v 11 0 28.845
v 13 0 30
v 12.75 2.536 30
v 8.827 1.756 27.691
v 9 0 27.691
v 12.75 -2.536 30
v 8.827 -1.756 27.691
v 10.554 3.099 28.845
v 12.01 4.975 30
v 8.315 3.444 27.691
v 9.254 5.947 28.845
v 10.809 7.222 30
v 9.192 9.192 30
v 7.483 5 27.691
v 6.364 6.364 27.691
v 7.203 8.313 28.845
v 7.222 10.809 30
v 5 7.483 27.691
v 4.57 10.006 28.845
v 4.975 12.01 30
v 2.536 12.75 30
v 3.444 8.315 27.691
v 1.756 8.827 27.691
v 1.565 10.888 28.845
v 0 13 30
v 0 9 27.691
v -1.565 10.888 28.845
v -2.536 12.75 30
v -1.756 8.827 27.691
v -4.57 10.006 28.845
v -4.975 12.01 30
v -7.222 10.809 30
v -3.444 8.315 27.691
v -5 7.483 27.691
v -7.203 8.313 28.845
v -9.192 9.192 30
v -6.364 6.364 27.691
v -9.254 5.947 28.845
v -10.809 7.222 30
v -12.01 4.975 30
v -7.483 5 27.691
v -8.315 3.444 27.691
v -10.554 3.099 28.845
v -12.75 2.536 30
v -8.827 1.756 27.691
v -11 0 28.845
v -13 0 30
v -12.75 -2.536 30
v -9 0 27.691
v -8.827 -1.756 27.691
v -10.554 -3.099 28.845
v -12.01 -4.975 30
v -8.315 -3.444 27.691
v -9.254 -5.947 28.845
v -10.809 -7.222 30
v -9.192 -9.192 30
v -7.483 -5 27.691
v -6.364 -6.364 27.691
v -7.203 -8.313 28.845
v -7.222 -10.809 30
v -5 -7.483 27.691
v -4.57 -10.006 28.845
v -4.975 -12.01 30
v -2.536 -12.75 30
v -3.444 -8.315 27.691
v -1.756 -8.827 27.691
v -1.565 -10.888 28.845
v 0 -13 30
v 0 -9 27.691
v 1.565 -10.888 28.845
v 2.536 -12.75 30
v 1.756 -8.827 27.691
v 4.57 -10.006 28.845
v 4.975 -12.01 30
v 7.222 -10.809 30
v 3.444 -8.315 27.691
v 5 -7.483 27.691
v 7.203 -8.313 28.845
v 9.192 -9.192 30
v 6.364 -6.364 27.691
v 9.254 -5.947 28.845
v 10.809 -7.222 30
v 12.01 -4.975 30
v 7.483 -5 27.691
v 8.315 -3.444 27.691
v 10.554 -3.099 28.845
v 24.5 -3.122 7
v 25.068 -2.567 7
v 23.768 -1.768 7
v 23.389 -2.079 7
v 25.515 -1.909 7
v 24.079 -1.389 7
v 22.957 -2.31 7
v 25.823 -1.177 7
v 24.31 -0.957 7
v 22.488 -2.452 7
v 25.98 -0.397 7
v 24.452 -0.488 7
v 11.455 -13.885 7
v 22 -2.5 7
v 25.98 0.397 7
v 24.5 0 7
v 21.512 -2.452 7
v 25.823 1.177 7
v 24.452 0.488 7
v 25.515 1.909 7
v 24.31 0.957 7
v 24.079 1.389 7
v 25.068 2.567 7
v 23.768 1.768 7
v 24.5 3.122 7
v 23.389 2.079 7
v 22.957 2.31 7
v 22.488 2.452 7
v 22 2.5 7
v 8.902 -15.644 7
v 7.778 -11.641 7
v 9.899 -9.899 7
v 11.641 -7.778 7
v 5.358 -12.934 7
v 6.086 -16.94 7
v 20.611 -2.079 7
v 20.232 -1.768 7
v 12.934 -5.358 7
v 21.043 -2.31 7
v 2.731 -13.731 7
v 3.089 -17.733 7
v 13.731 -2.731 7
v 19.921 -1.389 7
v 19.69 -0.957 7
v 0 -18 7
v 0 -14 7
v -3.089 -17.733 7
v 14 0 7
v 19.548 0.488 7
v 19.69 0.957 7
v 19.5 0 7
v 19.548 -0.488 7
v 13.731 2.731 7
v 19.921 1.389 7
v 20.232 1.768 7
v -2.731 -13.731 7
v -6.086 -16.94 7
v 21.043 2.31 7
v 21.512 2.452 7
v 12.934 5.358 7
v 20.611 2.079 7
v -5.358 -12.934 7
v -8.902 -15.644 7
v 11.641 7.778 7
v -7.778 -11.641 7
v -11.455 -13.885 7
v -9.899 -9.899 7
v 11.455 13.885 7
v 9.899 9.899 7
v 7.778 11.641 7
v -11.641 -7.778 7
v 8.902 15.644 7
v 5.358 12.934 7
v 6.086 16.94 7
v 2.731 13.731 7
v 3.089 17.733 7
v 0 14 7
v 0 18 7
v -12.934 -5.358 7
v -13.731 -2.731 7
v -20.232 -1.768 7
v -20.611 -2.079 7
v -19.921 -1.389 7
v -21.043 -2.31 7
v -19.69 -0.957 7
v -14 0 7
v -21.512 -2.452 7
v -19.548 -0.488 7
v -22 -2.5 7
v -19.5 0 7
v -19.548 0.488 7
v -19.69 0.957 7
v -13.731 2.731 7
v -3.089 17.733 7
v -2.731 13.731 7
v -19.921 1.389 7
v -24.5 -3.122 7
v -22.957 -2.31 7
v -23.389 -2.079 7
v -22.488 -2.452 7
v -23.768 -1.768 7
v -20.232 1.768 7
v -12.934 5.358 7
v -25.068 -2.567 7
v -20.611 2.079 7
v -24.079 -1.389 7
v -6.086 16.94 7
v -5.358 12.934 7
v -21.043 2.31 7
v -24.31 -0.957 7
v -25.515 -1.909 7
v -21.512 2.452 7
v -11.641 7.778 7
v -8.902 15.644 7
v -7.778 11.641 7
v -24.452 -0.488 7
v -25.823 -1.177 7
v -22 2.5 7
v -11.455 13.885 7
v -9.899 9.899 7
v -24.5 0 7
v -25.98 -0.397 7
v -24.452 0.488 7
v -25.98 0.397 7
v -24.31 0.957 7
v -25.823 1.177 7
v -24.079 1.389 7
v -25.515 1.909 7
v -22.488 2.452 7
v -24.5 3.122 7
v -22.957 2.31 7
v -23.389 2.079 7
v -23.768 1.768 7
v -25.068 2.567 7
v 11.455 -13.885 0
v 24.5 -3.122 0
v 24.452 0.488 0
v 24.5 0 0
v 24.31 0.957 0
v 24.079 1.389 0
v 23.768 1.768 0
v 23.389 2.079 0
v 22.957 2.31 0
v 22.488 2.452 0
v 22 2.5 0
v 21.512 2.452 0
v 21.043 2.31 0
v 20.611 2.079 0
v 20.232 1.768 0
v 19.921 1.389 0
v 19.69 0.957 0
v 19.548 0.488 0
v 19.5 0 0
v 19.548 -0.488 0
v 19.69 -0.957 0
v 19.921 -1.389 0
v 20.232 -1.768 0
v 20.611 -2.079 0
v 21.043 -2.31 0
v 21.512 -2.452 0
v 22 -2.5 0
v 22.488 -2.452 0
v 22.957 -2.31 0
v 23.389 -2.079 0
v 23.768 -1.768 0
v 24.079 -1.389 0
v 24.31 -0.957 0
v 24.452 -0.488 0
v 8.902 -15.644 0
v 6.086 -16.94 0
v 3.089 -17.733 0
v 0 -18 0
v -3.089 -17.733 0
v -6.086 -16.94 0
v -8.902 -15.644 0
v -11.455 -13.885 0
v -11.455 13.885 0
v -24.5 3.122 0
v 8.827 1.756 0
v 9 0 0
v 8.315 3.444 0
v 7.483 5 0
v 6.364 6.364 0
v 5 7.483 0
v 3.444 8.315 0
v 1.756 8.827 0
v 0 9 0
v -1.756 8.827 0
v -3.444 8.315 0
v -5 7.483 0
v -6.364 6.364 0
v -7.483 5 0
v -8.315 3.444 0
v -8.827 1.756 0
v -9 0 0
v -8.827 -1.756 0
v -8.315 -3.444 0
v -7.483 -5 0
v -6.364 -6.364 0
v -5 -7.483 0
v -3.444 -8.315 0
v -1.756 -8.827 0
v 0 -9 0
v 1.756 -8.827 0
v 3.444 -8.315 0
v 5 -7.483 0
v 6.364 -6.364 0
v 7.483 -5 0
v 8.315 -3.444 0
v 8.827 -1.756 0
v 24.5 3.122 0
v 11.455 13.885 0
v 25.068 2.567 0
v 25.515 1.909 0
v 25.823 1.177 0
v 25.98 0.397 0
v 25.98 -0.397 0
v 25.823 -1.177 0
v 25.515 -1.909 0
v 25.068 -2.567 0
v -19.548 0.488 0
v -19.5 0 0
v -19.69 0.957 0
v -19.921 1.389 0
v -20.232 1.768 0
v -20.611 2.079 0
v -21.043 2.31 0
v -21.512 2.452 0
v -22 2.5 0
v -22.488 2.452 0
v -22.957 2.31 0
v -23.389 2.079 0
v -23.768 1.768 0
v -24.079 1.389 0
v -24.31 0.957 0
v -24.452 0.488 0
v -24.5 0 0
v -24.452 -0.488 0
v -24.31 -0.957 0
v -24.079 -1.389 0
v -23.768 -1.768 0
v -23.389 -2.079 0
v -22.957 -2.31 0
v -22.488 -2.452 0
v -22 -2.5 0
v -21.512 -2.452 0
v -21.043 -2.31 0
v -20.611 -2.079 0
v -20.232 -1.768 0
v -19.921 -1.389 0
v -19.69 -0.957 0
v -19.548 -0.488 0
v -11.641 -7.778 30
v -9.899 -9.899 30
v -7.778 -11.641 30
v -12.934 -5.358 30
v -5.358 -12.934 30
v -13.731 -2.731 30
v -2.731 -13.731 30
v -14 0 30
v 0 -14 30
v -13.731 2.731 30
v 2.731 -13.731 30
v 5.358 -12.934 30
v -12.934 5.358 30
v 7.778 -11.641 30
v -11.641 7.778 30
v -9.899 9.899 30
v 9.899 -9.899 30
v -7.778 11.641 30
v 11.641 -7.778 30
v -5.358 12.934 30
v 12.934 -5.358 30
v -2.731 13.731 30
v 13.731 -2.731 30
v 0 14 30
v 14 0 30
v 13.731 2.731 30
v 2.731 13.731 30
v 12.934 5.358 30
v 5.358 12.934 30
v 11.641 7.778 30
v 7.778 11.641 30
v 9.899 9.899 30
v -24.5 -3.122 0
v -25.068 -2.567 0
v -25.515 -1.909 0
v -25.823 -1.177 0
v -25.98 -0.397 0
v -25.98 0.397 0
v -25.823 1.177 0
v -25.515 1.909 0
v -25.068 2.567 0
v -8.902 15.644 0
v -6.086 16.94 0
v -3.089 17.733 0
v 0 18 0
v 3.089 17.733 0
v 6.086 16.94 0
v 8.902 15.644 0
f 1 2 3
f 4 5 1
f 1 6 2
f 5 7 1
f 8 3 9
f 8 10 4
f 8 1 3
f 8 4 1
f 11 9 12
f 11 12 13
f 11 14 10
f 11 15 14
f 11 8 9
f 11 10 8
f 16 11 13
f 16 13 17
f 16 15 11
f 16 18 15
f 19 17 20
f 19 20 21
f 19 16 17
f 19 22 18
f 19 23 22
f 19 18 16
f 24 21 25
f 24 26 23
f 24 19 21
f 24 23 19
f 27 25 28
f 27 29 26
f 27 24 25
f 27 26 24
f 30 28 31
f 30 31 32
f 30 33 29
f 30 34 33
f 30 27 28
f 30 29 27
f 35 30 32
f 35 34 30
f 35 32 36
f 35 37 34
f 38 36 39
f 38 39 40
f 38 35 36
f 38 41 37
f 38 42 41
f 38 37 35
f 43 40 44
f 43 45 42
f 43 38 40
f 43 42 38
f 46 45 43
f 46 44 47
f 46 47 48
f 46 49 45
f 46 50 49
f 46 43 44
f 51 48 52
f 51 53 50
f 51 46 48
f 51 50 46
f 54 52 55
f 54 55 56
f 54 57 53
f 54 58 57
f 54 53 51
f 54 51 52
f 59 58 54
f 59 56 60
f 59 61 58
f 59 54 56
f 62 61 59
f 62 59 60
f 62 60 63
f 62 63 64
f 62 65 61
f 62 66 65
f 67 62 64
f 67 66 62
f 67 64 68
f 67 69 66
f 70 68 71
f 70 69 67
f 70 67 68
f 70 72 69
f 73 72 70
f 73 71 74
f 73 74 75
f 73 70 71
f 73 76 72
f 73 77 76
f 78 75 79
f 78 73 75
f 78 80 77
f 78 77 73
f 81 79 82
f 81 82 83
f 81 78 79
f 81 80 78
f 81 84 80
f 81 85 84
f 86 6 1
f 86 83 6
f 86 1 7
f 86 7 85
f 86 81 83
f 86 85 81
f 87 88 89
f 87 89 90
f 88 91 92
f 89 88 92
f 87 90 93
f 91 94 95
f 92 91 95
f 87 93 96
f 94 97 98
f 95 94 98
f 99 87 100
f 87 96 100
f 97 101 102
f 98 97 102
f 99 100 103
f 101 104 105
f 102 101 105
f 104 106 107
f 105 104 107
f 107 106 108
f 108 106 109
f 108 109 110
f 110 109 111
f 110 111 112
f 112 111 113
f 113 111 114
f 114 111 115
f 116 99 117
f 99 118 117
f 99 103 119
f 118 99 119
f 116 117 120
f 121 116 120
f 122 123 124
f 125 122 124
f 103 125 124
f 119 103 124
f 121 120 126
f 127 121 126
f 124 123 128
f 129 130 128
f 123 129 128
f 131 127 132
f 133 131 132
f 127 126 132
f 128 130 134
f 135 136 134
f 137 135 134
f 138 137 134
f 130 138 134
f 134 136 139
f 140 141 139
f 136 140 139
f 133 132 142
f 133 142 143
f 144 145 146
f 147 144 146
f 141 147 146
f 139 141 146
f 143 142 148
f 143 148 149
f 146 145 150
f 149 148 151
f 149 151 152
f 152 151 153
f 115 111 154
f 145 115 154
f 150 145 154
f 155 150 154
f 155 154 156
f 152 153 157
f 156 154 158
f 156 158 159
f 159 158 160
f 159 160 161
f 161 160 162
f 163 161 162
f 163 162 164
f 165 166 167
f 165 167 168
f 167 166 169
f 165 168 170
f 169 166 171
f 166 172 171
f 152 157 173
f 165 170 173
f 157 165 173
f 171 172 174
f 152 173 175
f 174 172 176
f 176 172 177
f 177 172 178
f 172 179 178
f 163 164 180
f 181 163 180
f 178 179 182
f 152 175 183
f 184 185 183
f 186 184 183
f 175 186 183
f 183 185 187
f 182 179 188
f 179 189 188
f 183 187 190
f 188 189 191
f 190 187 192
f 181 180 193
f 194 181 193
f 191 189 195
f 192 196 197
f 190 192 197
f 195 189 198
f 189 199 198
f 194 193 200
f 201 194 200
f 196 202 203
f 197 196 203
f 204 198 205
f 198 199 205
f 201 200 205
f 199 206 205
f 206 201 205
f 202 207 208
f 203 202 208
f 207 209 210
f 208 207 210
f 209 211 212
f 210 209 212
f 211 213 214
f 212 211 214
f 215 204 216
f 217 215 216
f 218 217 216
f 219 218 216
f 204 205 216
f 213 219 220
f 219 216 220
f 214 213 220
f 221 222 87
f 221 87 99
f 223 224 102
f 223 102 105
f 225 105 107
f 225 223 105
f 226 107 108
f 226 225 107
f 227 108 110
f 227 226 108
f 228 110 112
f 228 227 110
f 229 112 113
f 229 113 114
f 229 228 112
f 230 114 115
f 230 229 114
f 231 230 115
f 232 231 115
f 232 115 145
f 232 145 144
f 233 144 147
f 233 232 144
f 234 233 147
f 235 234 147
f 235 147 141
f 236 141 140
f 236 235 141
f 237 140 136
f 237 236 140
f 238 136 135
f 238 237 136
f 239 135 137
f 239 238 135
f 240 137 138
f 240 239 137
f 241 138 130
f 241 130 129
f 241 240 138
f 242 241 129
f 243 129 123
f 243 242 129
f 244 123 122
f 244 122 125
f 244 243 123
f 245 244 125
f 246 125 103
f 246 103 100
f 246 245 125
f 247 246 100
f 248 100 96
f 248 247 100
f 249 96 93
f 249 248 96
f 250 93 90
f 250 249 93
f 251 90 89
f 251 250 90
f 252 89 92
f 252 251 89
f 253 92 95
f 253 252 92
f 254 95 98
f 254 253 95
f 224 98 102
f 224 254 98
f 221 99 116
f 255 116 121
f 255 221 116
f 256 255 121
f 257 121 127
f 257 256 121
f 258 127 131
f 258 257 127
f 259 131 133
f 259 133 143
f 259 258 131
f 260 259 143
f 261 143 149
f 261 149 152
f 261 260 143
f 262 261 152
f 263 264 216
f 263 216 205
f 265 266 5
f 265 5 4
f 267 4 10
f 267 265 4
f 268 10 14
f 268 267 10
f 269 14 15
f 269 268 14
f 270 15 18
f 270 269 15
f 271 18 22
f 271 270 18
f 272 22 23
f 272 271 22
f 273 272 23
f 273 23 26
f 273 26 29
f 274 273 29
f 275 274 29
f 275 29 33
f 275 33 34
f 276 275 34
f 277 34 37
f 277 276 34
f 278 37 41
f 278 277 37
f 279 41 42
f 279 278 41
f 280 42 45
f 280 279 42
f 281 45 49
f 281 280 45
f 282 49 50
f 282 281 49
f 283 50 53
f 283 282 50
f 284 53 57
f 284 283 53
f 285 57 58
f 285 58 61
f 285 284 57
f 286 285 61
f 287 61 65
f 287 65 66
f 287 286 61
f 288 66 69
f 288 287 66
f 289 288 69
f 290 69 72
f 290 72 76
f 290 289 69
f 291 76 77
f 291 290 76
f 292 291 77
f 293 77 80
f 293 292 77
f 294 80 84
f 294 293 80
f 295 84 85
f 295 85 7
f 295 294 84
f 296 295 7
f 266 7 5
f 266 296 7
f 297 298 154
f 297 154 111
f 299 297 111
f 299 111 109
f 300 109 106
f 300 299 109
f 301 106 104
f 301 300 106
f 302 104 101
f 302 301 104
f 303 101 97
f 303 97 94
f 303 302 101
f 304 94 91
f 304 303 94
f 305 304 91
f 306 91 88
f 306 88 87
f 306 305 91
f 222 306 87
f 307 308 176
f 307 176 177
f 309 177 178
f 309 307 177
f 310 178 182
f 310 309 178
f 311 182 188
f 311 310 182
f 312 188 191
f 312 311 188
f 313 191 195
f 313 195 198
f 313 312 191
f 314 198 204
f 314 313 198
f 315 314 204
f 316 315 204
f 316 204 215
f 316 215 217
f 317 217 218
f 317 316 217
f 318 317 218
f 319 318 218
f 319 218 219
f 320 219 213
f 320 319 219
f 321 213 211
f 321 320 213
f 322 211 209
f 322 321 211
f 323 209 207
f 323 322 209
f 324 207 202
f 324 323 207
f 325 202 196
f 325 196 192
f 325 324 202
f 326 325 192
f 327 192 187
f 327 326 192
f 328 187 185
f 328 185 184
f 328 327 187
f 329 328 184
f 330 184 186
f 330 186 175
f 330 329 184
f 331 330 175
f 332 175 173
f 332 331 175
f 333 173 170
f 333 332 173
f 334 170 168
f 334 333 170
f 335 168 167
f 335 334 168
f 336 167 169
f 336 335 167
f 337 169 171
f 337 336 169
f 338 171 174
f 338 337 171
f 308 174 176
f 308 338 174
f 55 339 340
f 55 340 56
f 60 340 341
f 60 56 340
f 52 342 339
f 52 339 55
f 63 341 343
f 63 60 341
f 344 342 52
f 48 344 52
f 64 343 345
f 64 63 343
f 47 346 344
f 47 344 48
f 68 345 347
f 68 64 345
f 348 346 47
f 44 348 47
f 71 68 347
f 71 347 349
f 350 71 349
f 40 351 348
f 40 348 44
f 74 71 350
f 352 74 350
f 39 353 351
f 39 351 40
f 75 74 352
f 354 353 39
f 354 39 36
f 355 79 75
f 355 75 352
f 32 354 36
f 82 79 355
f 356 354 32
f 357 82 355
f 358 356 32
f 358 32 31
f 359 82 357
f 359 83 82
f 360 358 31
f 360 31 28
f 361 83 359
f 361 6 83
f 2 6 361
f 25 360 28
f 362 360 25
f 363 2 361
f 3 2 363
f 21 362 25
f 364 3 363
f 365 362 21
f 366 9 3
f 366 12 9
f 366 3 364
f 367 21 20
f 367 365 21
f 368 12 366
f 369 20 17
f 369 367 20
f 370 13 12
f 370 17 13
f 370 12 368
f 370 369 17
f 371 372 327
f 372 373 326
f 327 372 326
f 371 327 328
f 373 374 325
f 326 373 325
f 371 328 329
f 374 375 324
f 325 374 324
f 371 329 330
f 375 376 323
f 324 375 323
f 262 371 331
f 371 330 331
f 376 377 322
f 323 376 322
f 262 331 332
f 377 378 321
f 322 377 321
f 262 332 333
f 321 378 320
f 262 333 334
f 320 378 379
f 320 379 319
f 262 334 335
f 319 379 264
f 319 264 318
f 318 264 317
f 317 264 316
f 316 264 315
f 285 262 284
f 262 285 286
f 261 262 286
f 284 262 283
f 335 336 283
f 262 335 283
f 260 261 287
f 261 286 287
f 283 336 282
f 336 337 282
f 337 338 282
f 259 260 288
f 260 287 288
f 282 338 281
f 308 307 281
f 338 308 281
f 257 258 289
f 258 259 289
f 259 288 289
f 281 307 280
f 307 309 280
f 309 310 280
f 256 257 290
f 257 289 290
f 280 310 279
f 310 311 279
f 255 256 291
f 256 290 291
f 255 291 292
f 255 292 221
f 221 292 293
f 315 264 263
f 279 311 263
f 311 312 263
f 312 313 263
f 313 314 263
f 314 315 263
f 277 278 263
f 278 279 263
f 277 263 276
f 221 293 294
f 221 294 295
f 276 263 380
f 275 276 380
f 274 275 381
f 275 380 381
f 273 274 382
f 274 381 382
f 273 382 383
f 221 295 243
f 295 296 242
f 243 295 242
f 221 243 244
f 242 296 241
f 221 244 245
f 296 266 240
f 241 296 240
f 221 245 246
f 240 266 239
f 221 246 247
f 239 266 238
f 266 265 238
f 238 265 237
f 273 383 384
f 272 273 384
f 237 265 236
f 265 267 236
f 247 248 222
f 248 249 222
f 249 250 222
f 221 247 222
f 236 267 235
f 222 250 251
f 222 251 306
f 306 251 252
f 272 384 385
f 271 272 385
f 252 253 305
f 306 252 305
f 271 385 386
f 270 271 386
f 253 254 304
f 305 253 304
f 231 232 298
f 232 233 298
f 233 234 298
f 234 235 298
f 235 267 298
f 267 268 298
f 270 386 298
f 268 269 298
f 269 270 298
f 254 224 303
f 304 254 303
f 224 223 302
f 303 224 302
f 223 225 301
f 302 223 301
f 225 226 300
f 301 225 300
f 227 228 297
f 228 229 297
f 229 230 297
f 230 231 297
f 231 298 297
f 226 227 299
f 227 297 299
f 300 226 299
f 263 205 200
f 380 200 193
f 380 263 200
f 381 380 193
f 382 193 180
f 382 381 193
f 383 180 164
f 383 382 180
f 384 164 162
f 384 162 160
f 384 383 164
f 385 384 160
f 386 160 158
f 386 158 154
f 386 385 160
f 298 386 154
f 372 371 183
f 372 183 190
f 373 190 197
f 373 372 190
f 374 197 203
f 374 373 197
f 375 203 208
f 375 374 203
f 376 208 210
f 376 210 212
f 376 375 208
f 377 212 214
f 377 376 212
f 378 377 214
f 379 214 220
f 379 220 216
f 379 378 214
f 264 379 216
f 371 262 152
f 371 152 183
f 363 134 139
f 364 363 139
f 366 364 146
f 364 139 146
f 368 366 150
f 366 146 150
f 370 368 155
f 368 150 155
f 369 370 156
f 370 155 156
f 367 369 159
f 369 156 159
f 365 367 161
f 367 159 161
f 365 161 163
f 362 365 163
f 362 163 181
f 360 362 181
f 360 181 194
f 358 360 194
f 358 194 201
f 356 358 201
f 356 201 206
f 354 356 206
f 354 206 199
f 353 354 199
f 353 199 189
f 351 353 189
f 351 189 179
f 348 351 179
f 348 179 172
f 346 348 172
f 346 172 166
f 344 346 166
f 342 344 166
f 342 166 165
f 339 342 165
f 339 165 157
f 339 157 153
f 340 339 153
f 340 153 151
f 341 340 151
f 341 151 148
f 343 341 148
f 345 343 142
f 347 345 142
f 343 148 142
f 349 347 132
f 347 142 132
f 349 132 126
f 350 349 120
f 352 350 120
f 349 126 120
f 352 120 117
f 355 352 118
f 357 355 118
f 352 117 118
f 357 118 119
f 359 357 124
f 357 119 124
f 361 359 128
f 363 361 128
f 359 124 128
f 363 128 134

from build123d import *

# Parameters (mm, degrees)
SKETCH_1_R          = 2.5
EXTRUDE_1_DEPTH     = 7
SKETCH_1_5_R        = 14
SKETCH_1_5_R_2      = 9
EXTRUDE_3_DEPTH     = 30
SKETCH_1_6_R        = 9
CUT_EXTRUDE_2_DEPTH = 7
CHAMFER_1_SIZE      = 4
CHAMFER_1_SIZE2     = 2.309401077


with BuildPart() as part:
    # 草图1 → 凸台-拉伸1 (new body)
    with BuildSketch(Plane.XY):
        with BuildLine():
            Line((-11.454897552, 13.884715412), (-24.5, 3.122498999))
            ThreePointArc((-24.5, 3.122498999), (-26, 0), (-24.5, -3.122498999))
            Line((-24.5, -3.122498999), (-11.454897552, -13.884715412))
            ThreePointArc((-11.454897552, -13.884715412), (0, -18), (11.454897552, -13.884715412))
            Line((11.454897552, -13.884715412), (24.5, -3.122498999))
            ThreePointArc((24.5, -3.122498999), (26, 0), (24.5, 3.122498999))
            Line((24.5, 3.122498999), (11.454897552, 13.884715412))
            ThreePointArc((11.454897552, 13.884715412), (0, 18), (-11.454897552, 13.884715412))
        make_face()
        with Locations((-22, 0)):
            Circle(SKETCH_1_R, mode=Mode.SUBTRACT)
        with Locations((22, 0)):
            Circle(SKETCH_1_R, mode=Mode.SUBTRACT)
    extrude(amount=EXTRUDE_1_DEPTH)

    # 草图1<5> → 凸台-拉伸3 (add)
    with BuildSketch(Plane.XY):
        Circle(SKETCH_1_5_R)
        Circle(SKETCH_1_5_R_2, mode=Mode.SUBTRACT)
    extrude(amount=EXTRUDE_3_DEPTH)

    # 草图1<6> → 切除-拉伸2 (cut)
    with BuildSketch(Plane.XY):
        Circle(SKETCH_1_6_R)
    extrude(amount=CUT_EXTRUDE_2_DEPTH, mode=Mode.SUBTRACT)

    # 倒角1
    chamfer_1_edges = [part.edges().sort_by_distance(p)[0] for p in [
        (-9, 0, 30),
    ]]
    chamfer_1_side = [part.faces().sort_by_distance(p)[0] for p in [
        (-13.604020203, 0, 30),
    ]]
    chamfer(chamfer_1_edges, length=CHAMFER_1_SIZE, length2=CHAMFER_1_SIZE2, reference=chamfer_1_side[0])


solid = part.part
